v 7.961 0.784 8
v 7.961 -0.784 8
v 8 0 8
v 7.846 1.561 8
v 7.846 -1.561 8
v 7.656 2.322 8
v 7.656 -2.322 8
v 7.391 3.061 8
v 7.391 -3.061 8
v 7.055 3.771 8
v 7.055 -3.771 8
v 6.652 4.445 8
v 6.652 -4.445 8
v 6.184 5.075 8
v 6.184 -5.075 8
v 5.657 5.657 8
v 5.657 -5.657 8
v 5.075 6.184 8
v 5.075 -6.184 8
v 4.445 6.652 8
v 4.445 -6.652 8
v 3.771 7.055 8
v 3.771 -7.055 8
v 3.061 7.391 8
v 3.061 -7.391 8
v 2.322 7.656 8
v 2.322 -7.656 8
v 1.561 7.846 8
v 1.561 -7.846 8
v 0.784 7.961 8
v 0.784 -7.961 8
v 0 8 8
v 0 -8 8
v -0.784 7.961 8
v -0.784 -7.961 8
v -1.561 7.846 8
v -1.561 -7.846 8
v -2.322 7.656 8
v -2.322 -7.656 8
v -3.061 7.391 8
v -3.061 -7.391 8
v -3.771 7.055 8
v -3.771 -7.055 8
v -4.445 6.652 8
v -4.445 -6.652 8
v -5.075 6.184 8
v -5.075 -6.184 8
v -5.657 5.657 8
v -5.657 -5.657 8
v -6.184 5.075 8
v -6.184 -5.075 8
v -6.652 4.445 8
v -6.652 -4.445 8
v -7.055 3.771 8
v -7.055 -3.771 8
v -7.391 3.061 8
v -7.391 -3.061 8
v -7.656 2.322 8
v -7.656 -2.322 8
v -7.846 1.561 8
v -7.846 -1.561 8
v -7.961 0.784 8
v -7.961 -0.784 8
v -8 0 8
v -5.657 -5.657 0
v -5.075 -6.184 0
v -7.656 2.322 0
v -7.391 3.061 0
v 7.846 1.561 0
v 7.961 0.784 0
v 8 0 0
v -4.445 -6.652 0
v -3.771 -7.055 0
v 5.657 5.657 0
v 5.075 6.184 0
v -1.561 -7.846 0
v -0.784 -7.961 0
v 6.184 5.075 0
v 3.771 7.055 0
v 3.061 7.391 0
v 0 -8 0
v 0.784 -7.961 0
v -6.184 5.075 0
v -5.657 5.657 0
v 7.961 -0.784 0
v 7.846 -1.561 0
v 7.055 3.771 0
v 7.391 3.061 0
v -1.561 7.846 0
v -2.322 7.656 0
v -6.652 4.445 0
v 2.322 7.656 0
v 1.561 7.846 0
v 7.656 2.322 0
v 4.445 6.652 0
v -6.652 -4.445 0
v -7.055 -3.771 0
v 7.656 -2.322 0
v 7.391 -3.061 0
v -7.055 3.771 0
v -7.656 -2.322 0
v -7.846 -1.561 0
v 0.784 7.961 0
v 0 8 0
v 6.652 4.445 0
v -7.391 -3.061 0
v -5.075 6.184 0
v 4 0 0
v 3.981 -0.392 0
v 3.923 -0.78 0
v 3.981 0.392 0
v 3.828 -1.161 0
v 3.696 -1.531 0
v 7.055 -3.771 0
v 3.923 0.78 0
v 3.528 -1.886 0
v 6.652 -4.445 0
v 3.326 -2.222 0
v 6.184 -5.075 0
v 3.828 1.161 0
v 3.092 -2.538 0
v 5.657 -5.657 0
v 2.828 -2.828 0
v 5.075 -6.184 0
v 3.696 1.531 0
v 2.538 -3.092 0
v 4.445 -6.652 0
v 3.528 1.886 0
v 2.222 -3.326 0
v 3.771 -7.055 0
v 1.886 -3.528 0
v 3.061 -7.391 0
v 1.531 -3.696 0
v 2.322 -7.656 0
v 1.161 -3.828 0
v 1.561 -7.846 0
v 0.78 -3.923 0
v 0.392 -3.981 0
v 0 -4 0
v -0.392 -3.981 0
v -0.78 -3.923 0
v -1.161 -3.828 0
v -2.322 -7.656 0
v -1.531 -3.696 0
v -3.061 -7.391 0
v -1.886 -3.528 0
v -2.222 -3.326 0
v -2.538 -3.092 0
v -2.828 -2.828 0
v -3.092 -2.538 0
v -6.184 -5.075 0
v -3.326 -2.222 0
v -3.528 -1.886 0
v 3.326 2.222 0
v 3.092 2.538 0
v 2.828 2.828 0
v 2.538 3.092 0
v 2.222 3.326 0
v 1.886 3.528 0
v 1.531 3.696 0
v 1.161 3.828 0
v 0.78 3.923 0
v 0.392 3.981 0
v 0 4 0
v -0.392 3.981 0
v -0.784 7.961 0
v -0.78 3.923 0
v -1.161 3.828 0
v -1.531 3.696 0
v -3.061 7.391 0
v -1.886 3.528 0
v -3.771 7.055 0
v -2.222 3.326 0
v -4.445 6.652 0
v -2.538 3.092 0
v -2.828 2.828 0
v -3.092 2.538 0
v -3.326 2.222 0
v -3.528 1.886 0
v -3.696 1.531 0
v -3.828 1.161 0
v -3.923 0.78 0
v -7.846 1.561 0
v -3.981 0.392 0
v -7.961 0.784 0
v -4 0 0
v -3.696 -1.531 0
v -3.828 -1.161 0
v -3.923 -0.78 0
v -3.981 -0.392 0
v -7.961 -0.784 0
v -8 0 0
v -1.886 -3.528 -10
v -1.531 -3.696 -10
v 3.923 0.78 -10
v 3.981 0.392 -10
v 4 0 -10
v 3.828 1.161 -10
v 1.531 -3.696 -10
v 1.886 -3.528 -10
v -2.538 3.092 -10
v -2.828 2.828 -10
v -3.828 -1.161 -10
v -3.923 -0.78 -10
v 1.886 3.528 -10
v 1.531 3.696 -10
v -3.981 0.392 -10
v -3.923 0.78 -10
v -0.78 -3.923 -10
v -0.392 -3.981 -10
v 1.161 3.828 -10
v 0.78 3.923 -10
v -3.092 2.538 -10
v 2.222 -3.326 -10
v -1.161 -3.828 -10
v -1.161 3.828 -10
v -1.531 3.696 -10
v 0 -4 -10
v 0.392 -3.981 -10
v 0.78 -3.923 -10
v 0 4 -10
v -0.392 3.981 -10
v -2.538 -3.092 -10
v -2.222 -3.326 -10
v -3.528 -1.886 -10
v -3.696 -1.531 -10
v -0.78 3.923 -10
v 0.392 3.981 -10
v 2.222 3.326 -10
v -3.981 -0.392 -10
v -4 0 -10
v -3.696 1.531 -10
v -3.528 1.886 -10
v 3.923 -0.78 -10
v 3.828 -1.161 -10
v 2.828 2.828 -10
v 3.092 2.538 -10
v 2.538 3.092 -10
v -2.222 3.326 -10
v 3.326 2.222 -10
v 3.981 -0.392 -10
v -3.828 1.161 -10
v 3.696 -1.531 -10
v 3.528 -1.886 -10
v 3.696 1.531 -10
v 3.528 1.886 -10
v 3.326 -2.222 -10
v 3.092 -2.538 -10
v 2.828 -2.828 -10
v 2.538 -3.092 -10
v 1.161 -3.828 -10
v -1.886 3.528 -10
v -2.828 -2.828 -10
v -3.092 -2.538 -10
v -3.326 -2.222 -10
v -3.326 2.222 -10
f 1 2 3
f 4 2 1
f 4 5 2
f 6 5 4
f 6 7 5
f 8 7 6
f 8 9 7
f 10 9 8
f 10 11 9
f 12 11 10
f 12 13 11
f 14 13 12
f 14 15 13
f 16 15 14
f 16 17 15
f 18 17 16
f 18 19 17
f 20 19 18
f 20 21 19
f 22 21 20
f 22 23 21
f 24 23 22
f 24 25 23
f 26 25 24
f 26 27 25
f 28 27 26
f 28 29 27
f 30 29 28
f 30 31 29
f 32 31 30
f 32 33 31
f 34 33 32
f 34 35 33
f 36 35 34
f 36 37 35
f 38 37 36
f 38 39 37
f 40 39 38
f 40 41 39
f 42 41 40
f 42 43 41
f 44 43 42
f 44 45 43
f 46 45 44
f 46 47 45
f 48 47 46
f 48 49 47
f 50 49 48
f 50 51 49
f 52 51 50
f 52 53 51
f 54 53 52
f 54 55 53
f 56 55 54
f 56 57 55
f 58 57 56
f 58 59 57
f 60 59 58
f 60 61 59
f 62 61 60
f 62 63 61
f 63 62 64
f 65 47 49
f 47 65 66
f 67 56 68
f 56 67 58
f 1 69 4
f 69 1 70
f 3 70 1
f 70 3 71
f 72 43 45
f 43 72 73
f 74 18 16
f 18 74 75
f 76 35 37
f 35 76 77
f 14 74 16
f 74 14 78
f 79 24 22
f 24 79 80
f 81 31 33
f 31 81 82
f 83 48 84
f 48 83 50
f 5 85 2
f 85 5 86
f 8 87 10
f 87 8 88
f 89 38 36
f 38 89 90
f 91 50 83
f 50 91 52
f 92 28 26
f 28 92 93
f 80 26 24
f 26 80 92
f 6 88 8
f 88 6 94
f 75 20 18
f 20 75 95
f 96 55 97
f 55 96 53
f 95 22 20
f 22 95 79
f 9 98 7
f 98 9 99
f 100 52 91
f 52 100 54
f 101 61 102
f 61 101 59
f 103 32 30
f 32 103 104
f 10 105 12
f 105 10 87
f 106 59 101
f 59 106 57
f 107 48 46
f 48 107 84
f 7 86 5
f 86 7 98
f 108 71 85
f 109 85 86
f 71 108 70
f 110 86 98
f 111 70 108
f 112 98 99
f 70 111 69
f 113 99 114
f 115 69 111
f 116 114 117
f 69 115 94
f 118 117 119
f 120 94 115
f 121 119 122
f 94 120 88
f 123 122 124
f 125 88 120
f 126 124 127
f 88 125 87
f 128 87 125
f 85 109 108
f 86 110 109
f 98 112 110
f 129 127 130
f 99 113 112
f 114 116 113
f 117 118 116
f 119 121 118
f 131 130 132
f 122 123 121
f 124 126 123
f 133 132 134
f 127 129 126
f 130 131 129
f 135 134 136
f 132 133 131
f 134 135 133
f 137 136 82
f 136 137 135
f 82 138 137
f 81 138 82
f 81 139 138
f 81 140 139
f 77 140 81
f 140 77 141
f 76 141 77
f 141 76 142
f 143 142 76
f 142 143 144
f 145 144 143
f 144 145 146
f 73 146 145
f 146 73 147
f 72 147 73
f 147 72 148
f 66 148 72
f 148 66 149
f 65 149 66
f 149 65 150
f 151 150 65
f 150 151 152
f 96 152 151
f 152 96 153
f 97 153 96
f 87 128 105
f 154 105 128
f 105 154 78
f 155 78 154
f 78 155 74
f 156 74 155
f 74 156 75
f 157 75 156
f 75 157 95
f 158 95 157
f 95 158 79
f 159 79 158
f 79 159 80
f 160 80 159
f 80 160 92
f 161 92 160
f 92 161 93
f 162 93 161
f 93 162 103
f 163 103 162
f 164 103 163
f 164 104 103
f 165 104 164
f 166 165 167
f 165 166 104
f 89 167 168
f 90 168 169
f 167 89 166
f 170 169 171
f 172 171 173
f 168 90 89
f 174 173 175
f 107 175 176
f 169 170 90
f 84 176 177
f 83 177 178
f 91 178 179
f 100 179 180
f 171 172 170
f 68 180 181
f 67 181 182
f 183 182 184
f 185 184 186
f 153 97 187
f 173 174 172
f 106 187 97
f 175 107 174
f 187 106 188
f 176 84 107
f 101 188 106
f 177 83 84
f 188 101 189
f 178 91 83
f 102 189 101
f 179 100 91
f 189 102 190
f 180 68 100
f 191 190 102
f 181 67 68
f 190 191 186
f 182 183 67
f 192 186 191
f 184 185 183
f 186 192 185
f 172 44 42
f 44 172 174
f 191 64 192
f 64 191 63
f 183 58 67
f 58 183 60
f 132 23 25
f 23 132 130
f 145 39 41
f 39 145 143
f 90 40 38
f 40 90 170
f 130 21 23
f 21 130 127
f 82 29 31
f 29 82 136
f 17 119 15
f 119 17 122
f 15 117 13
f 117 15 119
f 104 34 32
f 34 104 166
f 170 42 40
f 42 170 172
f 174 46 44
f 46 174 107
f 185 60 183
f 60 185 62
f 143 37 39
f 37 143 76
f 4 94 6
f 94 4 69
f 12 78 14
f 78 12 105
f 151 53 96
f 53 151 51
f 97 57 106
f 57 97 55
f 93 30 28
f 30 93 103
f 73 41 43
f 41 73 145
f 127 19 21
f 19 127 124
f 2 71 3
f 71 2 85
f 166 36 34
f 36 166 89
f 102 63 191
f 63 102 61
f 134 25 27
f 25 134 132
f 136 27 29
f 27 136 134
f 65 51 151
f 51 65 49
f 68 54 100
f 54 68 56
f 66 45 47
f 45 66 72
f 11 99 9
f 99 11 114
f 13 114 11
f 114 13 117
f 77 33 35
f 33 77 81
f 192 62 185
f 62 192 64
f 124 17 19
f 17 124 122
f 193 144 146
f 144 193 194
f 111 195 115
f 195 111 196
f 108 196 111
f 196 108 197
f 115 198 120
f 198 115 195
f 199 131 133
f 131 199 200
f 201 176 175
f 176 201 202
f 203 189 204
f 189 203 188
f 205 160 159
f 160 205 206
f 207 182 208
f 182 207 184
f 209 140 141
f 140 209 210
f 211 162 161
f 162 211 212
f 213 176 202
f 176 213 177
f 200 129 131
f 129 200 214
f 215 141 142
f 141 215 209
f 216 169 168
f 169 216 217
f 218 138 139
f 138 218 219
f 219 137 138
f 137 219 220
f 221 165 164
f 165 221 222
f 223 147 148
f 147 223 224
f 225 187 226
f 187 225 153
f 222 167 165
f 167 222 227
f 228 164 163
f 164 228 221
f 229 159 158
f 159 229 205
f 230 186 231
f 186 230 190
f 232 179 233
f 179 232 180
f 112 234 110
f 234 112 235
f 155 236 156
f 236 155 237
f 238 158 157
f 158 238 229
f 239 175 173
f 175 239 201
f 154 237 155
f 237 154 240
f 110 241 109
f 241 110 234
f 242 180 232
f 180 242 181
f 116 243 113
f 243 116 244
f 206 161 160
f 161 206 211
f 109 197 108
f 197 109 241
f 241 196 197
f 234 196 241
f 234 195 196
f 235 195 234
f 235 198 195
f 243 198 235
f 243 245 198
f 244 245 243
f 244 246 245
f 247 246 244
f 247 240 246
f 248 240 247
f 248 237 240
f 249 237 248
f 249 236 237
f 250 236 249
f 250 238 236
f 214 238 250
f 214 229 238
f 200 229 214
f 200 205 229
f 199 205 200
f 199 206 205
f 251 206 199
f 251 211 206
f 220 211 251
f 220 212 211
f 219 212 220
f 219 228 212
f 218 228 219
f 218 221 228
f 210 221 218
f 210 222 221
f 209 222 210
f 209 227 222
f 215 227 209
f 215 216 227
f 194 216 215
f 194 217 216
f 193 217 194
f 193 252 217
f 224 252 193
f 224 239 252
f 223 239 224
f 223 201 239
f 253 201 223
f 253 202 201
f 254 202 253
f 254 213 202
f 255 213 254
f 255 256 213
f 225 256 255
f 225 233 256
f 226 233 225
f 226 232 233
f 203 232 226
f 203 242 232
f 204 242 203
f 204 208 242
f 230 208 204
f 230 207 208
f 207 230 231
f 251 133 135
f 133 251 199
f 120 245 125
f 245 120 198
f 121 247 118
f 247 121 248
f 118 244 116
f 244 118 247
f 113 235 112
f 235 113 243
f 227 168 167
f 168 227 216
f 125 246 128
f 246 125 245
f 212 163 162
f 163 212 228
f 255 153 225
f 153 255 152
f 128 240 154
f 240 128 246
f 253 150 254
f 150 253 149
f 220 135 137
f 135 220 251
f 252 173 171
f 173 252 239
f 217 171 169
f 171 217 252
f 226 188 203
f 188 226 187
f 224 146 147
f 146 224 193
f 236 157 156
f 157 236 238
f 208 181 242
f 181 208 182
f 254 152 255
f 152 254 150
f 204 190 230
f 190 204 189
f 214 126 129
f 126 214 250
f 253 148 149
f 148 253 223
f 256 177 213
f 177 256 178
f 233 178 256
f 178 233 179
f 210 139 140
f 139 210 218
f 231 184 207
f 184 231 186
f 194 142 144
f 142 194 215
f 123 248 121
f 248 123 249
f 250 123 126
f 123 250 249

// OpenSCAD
// Parameters
shank_diameter_mm = 8; //[4:16:0.1]
head_diameter_mm = 16; //[8:32:0.1]
length_mm = 10; //[5:20:0.5]
head_height_mm = 8; //[4:16:0.1]
socket_af_mm = 6; //[3:12:0.1]
socket_depth_mm = 5; //[2.5:10:0.1]
thread_length_mm = 8; //[4:20:0.5]
thread_diameter_mm = 7.6; //[3.8:15.2:0.1]
overlap_mm = 1; //[0.5:2:0.1]

// Hex socket calculation
hex_radius = socket_af_mm / (2 * cos(30));

// Screw and Washer - complete geometry
module screw_and_washer() {
  color("DimGray") {
    // Cap Head
    translate([0, 0, head_height_mm / 2])
      cylinder(r=head_diameter_mm / 2, h=head_height_mm, center=true, $fn=64);

    // Shank
    translate([0, 0, -length_mm / 2])
      cylinder(r=shank_diameter_mm / 2, h=length_mm, center=true, $fn=64);

    // Thread Region (Simplified)
    translate([0, 0, -length_mm + thread_length_mm / 2])
      cylinder(r=thread_diameter_mm / 2, h=thread_length_mm, center=true, $fn=64);

    // Hex Socket
    translate([0, 0, head_height_mm - socket_depth_mm / 2])
      rotate([0, 0, 0])
      difference() {
        cylinder(r=hex_radius, h=socket_depth_mm, center=true, $fn=6);
        cylinder(r=hex_radius - overlap_mm, h=socket_depth_mm + overlap_mm, center=true, $fn=6);
      }
  }
}

// Assembly
module assembly() {
  screw_and_washer();
}

assembly();
